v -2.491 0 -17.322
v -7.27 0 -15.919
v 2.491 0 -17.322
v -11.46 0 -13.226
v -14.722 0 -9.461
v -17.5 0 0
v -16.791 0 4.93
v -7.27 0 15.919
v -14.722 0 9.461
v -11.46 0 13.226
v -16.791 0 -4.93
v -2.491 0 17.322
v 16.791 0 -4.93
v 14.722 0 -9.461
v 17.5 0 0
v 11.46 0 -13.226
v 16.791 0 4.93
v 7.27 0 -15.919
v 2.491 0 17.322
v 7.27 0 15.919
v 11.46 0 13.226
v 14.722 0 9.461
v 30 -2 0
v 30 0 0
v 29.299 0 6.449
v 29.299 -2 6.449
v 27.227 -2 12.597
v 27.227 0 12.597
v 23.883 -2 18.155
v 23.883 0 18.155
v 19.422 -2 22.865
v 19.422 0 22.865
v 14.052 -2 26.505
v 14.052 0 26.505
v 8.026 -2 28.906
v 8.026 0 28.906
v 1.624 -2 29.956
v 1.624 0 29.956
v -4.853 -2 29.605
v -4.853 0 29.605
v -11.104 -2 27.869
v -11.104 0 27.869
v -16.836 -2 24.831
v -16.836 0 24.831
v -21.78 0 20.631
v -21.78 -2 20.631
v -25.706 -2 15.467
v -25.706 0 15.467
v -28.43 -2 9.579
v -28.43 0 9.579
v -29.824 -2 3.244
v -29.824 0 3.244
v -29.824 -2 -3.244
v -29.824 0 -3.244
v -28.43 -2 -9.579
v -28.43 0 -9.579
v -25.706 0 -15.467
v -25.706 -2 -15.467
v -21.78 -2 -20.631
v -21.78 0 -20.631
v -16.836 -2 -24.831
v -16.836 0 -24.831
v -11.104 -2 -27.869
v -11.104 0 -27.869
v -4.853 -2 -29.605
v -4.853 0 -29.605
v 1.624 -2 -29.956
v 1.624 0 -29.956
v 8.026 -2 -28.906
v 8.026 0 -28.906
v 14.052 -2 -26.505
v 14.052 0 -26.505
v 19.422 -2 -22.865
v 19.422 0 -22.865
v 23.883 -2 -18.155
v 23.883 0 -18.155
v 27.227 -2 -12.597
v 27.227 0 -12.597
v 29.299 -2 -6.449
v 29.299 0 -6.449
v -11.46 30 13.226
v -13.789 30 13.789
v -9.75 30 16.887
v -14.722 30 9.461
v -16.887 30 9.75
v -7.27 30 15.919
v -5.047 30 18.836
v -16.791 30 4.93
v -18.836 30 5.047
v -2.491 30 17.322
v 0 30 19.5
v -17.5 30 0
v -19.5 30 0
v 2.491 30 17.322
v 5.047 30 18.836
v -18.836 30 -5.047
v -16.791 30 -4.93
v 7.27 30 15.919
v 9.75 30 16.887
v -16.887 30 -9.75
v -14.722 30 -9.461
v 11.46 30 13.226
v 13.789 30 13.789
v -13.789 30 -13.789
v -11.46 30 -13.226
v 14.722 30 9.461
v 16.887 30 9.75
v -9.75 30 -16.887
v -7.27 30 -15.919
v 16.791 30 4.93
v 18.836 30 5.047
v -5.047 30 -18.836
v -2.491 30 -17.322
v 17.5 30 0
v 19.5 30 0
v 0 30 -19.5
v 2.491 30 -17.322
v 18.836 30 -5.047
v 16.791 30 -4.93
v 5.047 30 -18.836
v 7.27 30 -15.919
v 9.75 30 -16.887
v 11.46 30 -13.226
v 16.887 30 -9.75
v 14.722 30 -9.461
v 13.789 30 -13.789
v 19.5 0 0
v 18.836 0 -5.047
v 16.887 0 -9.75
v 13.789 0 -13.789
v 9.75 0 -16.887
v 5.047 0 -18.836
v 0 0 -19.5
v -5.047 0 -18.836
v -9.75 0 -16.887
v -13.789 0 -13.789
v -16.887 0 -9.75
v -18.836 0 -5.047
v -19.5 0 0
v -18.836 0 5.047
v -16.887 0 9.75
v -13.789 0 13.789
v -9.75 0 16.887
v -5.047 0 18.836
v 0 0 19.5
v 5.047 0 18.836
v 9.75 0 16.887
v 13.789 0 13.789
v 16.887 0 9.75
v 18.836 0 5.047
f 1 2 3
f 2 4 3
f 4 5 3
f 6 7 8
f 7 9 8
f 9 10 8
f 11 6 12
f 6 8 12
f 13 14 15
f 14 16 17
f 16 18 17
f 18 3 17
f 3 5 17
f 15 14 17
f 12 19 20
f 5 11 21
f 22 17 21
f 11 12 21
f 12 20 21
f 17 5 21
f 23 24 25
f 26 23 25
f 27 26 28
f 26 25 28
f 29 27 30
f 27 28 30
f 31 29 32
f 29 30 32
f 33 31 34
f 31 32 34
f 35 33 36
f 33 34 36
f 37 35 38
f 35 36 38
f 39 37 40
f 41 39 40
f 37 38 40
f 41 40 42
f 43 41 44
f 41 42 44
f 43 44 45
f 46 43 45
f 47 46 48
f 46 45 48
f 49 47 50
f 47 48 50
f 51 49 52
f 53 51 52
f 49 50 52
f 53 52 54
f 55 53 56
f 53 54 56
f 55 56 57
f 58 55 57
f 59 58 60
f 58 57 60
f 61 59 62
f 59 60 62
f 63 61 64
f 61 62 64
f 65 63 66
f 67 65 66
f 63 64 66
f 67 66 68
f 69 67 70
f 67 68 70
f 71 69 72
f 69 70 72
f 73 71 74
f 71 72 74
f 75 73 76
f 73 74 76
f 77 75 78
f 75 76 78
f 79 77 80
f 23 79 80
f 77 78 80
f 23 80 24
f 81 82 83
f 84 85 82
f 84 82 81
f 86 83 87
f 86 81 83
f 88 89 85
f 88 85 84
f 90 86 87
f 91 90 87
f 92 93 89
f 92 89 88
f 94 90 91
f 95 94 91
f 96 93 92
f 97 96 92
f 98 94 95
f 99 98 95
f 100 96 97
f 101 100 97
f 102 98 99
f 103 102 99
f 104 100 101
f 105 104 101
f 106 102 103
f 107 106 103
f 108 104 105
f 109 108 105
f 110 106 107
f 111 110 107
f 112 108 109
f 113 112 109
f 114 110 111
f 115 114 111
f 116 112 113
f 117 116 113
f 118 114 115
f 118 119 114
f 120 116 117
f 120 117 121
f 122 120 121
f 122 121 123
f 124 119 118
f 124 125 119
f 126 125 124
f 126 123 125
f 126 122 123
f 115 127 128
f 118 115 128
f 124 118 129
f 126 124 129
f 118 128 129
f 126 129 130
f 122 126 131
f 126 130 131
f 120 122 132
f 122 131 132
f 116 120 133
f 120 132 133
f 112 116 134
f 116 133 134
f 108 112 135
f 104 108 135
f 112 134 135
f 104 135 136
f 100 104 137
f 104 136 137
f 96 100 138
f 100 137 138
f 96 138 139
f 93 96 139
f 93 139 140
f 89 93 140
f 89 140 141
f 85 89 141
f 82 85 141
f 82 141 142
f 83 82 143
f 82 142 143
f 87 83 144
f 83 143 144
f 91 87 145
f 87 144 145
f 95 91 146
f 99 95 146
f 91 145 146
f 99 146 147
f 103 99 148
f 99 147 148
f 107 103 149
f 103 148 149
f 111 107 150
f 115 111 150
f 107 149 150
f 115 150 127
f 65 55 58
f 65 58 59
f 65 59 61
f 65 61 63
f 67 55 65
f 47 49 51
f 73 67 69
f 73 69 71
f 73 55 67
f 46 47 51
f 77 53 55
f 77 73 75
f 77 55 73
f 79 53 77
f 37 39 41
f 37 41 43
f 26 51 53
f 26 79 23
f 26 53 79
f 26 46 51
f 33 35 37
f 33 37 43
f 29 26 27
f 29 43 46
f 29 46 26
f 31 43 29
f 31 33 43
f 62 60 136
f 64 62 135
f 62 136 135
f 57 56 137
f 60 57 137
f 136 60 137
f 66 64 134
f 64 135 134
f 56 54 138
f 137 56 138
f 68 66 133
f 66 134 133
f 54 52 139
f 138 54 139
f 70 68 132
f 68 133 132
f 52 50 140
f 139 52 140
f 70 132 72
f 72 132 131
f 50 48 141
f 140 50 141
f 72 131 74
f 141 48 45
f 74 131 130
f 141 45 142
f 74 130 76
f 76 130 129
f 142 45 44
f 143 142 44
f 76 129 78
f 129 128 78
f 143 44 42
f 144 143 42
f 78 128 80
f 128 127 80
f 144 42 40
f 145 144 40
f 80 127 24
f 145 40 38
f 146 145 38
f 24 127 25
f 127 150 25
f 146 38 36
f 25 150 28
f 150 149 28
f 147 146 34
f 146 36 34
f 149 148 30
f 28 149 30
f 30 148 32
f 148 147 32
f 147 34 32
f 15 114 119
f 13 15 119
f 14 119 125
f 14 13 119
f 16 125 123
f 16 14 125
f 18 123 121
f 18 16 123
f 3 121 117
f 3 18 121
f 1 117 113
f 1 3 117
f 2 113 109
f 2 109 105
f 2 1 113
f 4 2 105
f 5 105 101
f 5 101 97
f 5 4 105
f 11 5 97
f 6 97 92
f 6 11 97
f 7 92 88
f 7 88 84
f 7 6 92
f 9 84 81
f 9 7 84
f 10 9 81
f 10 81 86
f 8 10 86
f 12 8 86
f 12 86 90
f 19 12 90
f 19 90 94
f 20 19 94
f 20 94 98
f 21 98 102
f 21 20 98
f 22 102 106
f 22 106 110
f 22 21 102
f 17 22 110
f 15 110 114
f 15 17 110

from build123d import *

# Parameters (mm, degrees)
SKETCH1_R           = 19.5
SKETCH1_R_2         = 17.5
BOSS_EXTRUDE1_DEPTH = 30
SKETCH2_R           = 30
BOSS_EXTRUDE2_DEPTH = 2


with BuildPart() as part:
    # Sketch1 → Boss-Extrude1 (new body)
    with BuildSketch(Plane(origin=(0, 0, 0), x_dir=(1, 0, 0), z_dir=(0, 1, 0))):
        Circle(SKETCH1_R)
        Circle(SKETCH1_R_2, mode=Mode.SUBTRACT)
    extrude(amount=BOSS_EXTRUDE1_DEPTH)

    # Sketch2 → Boss-Extrude2 (add)
    with BuildSketch(Plane.XZ):
        Circle(SKETCH2_R)
    extrude(amount=BOSS_EXTRUDE2_DEPTH)


solid = part.part
